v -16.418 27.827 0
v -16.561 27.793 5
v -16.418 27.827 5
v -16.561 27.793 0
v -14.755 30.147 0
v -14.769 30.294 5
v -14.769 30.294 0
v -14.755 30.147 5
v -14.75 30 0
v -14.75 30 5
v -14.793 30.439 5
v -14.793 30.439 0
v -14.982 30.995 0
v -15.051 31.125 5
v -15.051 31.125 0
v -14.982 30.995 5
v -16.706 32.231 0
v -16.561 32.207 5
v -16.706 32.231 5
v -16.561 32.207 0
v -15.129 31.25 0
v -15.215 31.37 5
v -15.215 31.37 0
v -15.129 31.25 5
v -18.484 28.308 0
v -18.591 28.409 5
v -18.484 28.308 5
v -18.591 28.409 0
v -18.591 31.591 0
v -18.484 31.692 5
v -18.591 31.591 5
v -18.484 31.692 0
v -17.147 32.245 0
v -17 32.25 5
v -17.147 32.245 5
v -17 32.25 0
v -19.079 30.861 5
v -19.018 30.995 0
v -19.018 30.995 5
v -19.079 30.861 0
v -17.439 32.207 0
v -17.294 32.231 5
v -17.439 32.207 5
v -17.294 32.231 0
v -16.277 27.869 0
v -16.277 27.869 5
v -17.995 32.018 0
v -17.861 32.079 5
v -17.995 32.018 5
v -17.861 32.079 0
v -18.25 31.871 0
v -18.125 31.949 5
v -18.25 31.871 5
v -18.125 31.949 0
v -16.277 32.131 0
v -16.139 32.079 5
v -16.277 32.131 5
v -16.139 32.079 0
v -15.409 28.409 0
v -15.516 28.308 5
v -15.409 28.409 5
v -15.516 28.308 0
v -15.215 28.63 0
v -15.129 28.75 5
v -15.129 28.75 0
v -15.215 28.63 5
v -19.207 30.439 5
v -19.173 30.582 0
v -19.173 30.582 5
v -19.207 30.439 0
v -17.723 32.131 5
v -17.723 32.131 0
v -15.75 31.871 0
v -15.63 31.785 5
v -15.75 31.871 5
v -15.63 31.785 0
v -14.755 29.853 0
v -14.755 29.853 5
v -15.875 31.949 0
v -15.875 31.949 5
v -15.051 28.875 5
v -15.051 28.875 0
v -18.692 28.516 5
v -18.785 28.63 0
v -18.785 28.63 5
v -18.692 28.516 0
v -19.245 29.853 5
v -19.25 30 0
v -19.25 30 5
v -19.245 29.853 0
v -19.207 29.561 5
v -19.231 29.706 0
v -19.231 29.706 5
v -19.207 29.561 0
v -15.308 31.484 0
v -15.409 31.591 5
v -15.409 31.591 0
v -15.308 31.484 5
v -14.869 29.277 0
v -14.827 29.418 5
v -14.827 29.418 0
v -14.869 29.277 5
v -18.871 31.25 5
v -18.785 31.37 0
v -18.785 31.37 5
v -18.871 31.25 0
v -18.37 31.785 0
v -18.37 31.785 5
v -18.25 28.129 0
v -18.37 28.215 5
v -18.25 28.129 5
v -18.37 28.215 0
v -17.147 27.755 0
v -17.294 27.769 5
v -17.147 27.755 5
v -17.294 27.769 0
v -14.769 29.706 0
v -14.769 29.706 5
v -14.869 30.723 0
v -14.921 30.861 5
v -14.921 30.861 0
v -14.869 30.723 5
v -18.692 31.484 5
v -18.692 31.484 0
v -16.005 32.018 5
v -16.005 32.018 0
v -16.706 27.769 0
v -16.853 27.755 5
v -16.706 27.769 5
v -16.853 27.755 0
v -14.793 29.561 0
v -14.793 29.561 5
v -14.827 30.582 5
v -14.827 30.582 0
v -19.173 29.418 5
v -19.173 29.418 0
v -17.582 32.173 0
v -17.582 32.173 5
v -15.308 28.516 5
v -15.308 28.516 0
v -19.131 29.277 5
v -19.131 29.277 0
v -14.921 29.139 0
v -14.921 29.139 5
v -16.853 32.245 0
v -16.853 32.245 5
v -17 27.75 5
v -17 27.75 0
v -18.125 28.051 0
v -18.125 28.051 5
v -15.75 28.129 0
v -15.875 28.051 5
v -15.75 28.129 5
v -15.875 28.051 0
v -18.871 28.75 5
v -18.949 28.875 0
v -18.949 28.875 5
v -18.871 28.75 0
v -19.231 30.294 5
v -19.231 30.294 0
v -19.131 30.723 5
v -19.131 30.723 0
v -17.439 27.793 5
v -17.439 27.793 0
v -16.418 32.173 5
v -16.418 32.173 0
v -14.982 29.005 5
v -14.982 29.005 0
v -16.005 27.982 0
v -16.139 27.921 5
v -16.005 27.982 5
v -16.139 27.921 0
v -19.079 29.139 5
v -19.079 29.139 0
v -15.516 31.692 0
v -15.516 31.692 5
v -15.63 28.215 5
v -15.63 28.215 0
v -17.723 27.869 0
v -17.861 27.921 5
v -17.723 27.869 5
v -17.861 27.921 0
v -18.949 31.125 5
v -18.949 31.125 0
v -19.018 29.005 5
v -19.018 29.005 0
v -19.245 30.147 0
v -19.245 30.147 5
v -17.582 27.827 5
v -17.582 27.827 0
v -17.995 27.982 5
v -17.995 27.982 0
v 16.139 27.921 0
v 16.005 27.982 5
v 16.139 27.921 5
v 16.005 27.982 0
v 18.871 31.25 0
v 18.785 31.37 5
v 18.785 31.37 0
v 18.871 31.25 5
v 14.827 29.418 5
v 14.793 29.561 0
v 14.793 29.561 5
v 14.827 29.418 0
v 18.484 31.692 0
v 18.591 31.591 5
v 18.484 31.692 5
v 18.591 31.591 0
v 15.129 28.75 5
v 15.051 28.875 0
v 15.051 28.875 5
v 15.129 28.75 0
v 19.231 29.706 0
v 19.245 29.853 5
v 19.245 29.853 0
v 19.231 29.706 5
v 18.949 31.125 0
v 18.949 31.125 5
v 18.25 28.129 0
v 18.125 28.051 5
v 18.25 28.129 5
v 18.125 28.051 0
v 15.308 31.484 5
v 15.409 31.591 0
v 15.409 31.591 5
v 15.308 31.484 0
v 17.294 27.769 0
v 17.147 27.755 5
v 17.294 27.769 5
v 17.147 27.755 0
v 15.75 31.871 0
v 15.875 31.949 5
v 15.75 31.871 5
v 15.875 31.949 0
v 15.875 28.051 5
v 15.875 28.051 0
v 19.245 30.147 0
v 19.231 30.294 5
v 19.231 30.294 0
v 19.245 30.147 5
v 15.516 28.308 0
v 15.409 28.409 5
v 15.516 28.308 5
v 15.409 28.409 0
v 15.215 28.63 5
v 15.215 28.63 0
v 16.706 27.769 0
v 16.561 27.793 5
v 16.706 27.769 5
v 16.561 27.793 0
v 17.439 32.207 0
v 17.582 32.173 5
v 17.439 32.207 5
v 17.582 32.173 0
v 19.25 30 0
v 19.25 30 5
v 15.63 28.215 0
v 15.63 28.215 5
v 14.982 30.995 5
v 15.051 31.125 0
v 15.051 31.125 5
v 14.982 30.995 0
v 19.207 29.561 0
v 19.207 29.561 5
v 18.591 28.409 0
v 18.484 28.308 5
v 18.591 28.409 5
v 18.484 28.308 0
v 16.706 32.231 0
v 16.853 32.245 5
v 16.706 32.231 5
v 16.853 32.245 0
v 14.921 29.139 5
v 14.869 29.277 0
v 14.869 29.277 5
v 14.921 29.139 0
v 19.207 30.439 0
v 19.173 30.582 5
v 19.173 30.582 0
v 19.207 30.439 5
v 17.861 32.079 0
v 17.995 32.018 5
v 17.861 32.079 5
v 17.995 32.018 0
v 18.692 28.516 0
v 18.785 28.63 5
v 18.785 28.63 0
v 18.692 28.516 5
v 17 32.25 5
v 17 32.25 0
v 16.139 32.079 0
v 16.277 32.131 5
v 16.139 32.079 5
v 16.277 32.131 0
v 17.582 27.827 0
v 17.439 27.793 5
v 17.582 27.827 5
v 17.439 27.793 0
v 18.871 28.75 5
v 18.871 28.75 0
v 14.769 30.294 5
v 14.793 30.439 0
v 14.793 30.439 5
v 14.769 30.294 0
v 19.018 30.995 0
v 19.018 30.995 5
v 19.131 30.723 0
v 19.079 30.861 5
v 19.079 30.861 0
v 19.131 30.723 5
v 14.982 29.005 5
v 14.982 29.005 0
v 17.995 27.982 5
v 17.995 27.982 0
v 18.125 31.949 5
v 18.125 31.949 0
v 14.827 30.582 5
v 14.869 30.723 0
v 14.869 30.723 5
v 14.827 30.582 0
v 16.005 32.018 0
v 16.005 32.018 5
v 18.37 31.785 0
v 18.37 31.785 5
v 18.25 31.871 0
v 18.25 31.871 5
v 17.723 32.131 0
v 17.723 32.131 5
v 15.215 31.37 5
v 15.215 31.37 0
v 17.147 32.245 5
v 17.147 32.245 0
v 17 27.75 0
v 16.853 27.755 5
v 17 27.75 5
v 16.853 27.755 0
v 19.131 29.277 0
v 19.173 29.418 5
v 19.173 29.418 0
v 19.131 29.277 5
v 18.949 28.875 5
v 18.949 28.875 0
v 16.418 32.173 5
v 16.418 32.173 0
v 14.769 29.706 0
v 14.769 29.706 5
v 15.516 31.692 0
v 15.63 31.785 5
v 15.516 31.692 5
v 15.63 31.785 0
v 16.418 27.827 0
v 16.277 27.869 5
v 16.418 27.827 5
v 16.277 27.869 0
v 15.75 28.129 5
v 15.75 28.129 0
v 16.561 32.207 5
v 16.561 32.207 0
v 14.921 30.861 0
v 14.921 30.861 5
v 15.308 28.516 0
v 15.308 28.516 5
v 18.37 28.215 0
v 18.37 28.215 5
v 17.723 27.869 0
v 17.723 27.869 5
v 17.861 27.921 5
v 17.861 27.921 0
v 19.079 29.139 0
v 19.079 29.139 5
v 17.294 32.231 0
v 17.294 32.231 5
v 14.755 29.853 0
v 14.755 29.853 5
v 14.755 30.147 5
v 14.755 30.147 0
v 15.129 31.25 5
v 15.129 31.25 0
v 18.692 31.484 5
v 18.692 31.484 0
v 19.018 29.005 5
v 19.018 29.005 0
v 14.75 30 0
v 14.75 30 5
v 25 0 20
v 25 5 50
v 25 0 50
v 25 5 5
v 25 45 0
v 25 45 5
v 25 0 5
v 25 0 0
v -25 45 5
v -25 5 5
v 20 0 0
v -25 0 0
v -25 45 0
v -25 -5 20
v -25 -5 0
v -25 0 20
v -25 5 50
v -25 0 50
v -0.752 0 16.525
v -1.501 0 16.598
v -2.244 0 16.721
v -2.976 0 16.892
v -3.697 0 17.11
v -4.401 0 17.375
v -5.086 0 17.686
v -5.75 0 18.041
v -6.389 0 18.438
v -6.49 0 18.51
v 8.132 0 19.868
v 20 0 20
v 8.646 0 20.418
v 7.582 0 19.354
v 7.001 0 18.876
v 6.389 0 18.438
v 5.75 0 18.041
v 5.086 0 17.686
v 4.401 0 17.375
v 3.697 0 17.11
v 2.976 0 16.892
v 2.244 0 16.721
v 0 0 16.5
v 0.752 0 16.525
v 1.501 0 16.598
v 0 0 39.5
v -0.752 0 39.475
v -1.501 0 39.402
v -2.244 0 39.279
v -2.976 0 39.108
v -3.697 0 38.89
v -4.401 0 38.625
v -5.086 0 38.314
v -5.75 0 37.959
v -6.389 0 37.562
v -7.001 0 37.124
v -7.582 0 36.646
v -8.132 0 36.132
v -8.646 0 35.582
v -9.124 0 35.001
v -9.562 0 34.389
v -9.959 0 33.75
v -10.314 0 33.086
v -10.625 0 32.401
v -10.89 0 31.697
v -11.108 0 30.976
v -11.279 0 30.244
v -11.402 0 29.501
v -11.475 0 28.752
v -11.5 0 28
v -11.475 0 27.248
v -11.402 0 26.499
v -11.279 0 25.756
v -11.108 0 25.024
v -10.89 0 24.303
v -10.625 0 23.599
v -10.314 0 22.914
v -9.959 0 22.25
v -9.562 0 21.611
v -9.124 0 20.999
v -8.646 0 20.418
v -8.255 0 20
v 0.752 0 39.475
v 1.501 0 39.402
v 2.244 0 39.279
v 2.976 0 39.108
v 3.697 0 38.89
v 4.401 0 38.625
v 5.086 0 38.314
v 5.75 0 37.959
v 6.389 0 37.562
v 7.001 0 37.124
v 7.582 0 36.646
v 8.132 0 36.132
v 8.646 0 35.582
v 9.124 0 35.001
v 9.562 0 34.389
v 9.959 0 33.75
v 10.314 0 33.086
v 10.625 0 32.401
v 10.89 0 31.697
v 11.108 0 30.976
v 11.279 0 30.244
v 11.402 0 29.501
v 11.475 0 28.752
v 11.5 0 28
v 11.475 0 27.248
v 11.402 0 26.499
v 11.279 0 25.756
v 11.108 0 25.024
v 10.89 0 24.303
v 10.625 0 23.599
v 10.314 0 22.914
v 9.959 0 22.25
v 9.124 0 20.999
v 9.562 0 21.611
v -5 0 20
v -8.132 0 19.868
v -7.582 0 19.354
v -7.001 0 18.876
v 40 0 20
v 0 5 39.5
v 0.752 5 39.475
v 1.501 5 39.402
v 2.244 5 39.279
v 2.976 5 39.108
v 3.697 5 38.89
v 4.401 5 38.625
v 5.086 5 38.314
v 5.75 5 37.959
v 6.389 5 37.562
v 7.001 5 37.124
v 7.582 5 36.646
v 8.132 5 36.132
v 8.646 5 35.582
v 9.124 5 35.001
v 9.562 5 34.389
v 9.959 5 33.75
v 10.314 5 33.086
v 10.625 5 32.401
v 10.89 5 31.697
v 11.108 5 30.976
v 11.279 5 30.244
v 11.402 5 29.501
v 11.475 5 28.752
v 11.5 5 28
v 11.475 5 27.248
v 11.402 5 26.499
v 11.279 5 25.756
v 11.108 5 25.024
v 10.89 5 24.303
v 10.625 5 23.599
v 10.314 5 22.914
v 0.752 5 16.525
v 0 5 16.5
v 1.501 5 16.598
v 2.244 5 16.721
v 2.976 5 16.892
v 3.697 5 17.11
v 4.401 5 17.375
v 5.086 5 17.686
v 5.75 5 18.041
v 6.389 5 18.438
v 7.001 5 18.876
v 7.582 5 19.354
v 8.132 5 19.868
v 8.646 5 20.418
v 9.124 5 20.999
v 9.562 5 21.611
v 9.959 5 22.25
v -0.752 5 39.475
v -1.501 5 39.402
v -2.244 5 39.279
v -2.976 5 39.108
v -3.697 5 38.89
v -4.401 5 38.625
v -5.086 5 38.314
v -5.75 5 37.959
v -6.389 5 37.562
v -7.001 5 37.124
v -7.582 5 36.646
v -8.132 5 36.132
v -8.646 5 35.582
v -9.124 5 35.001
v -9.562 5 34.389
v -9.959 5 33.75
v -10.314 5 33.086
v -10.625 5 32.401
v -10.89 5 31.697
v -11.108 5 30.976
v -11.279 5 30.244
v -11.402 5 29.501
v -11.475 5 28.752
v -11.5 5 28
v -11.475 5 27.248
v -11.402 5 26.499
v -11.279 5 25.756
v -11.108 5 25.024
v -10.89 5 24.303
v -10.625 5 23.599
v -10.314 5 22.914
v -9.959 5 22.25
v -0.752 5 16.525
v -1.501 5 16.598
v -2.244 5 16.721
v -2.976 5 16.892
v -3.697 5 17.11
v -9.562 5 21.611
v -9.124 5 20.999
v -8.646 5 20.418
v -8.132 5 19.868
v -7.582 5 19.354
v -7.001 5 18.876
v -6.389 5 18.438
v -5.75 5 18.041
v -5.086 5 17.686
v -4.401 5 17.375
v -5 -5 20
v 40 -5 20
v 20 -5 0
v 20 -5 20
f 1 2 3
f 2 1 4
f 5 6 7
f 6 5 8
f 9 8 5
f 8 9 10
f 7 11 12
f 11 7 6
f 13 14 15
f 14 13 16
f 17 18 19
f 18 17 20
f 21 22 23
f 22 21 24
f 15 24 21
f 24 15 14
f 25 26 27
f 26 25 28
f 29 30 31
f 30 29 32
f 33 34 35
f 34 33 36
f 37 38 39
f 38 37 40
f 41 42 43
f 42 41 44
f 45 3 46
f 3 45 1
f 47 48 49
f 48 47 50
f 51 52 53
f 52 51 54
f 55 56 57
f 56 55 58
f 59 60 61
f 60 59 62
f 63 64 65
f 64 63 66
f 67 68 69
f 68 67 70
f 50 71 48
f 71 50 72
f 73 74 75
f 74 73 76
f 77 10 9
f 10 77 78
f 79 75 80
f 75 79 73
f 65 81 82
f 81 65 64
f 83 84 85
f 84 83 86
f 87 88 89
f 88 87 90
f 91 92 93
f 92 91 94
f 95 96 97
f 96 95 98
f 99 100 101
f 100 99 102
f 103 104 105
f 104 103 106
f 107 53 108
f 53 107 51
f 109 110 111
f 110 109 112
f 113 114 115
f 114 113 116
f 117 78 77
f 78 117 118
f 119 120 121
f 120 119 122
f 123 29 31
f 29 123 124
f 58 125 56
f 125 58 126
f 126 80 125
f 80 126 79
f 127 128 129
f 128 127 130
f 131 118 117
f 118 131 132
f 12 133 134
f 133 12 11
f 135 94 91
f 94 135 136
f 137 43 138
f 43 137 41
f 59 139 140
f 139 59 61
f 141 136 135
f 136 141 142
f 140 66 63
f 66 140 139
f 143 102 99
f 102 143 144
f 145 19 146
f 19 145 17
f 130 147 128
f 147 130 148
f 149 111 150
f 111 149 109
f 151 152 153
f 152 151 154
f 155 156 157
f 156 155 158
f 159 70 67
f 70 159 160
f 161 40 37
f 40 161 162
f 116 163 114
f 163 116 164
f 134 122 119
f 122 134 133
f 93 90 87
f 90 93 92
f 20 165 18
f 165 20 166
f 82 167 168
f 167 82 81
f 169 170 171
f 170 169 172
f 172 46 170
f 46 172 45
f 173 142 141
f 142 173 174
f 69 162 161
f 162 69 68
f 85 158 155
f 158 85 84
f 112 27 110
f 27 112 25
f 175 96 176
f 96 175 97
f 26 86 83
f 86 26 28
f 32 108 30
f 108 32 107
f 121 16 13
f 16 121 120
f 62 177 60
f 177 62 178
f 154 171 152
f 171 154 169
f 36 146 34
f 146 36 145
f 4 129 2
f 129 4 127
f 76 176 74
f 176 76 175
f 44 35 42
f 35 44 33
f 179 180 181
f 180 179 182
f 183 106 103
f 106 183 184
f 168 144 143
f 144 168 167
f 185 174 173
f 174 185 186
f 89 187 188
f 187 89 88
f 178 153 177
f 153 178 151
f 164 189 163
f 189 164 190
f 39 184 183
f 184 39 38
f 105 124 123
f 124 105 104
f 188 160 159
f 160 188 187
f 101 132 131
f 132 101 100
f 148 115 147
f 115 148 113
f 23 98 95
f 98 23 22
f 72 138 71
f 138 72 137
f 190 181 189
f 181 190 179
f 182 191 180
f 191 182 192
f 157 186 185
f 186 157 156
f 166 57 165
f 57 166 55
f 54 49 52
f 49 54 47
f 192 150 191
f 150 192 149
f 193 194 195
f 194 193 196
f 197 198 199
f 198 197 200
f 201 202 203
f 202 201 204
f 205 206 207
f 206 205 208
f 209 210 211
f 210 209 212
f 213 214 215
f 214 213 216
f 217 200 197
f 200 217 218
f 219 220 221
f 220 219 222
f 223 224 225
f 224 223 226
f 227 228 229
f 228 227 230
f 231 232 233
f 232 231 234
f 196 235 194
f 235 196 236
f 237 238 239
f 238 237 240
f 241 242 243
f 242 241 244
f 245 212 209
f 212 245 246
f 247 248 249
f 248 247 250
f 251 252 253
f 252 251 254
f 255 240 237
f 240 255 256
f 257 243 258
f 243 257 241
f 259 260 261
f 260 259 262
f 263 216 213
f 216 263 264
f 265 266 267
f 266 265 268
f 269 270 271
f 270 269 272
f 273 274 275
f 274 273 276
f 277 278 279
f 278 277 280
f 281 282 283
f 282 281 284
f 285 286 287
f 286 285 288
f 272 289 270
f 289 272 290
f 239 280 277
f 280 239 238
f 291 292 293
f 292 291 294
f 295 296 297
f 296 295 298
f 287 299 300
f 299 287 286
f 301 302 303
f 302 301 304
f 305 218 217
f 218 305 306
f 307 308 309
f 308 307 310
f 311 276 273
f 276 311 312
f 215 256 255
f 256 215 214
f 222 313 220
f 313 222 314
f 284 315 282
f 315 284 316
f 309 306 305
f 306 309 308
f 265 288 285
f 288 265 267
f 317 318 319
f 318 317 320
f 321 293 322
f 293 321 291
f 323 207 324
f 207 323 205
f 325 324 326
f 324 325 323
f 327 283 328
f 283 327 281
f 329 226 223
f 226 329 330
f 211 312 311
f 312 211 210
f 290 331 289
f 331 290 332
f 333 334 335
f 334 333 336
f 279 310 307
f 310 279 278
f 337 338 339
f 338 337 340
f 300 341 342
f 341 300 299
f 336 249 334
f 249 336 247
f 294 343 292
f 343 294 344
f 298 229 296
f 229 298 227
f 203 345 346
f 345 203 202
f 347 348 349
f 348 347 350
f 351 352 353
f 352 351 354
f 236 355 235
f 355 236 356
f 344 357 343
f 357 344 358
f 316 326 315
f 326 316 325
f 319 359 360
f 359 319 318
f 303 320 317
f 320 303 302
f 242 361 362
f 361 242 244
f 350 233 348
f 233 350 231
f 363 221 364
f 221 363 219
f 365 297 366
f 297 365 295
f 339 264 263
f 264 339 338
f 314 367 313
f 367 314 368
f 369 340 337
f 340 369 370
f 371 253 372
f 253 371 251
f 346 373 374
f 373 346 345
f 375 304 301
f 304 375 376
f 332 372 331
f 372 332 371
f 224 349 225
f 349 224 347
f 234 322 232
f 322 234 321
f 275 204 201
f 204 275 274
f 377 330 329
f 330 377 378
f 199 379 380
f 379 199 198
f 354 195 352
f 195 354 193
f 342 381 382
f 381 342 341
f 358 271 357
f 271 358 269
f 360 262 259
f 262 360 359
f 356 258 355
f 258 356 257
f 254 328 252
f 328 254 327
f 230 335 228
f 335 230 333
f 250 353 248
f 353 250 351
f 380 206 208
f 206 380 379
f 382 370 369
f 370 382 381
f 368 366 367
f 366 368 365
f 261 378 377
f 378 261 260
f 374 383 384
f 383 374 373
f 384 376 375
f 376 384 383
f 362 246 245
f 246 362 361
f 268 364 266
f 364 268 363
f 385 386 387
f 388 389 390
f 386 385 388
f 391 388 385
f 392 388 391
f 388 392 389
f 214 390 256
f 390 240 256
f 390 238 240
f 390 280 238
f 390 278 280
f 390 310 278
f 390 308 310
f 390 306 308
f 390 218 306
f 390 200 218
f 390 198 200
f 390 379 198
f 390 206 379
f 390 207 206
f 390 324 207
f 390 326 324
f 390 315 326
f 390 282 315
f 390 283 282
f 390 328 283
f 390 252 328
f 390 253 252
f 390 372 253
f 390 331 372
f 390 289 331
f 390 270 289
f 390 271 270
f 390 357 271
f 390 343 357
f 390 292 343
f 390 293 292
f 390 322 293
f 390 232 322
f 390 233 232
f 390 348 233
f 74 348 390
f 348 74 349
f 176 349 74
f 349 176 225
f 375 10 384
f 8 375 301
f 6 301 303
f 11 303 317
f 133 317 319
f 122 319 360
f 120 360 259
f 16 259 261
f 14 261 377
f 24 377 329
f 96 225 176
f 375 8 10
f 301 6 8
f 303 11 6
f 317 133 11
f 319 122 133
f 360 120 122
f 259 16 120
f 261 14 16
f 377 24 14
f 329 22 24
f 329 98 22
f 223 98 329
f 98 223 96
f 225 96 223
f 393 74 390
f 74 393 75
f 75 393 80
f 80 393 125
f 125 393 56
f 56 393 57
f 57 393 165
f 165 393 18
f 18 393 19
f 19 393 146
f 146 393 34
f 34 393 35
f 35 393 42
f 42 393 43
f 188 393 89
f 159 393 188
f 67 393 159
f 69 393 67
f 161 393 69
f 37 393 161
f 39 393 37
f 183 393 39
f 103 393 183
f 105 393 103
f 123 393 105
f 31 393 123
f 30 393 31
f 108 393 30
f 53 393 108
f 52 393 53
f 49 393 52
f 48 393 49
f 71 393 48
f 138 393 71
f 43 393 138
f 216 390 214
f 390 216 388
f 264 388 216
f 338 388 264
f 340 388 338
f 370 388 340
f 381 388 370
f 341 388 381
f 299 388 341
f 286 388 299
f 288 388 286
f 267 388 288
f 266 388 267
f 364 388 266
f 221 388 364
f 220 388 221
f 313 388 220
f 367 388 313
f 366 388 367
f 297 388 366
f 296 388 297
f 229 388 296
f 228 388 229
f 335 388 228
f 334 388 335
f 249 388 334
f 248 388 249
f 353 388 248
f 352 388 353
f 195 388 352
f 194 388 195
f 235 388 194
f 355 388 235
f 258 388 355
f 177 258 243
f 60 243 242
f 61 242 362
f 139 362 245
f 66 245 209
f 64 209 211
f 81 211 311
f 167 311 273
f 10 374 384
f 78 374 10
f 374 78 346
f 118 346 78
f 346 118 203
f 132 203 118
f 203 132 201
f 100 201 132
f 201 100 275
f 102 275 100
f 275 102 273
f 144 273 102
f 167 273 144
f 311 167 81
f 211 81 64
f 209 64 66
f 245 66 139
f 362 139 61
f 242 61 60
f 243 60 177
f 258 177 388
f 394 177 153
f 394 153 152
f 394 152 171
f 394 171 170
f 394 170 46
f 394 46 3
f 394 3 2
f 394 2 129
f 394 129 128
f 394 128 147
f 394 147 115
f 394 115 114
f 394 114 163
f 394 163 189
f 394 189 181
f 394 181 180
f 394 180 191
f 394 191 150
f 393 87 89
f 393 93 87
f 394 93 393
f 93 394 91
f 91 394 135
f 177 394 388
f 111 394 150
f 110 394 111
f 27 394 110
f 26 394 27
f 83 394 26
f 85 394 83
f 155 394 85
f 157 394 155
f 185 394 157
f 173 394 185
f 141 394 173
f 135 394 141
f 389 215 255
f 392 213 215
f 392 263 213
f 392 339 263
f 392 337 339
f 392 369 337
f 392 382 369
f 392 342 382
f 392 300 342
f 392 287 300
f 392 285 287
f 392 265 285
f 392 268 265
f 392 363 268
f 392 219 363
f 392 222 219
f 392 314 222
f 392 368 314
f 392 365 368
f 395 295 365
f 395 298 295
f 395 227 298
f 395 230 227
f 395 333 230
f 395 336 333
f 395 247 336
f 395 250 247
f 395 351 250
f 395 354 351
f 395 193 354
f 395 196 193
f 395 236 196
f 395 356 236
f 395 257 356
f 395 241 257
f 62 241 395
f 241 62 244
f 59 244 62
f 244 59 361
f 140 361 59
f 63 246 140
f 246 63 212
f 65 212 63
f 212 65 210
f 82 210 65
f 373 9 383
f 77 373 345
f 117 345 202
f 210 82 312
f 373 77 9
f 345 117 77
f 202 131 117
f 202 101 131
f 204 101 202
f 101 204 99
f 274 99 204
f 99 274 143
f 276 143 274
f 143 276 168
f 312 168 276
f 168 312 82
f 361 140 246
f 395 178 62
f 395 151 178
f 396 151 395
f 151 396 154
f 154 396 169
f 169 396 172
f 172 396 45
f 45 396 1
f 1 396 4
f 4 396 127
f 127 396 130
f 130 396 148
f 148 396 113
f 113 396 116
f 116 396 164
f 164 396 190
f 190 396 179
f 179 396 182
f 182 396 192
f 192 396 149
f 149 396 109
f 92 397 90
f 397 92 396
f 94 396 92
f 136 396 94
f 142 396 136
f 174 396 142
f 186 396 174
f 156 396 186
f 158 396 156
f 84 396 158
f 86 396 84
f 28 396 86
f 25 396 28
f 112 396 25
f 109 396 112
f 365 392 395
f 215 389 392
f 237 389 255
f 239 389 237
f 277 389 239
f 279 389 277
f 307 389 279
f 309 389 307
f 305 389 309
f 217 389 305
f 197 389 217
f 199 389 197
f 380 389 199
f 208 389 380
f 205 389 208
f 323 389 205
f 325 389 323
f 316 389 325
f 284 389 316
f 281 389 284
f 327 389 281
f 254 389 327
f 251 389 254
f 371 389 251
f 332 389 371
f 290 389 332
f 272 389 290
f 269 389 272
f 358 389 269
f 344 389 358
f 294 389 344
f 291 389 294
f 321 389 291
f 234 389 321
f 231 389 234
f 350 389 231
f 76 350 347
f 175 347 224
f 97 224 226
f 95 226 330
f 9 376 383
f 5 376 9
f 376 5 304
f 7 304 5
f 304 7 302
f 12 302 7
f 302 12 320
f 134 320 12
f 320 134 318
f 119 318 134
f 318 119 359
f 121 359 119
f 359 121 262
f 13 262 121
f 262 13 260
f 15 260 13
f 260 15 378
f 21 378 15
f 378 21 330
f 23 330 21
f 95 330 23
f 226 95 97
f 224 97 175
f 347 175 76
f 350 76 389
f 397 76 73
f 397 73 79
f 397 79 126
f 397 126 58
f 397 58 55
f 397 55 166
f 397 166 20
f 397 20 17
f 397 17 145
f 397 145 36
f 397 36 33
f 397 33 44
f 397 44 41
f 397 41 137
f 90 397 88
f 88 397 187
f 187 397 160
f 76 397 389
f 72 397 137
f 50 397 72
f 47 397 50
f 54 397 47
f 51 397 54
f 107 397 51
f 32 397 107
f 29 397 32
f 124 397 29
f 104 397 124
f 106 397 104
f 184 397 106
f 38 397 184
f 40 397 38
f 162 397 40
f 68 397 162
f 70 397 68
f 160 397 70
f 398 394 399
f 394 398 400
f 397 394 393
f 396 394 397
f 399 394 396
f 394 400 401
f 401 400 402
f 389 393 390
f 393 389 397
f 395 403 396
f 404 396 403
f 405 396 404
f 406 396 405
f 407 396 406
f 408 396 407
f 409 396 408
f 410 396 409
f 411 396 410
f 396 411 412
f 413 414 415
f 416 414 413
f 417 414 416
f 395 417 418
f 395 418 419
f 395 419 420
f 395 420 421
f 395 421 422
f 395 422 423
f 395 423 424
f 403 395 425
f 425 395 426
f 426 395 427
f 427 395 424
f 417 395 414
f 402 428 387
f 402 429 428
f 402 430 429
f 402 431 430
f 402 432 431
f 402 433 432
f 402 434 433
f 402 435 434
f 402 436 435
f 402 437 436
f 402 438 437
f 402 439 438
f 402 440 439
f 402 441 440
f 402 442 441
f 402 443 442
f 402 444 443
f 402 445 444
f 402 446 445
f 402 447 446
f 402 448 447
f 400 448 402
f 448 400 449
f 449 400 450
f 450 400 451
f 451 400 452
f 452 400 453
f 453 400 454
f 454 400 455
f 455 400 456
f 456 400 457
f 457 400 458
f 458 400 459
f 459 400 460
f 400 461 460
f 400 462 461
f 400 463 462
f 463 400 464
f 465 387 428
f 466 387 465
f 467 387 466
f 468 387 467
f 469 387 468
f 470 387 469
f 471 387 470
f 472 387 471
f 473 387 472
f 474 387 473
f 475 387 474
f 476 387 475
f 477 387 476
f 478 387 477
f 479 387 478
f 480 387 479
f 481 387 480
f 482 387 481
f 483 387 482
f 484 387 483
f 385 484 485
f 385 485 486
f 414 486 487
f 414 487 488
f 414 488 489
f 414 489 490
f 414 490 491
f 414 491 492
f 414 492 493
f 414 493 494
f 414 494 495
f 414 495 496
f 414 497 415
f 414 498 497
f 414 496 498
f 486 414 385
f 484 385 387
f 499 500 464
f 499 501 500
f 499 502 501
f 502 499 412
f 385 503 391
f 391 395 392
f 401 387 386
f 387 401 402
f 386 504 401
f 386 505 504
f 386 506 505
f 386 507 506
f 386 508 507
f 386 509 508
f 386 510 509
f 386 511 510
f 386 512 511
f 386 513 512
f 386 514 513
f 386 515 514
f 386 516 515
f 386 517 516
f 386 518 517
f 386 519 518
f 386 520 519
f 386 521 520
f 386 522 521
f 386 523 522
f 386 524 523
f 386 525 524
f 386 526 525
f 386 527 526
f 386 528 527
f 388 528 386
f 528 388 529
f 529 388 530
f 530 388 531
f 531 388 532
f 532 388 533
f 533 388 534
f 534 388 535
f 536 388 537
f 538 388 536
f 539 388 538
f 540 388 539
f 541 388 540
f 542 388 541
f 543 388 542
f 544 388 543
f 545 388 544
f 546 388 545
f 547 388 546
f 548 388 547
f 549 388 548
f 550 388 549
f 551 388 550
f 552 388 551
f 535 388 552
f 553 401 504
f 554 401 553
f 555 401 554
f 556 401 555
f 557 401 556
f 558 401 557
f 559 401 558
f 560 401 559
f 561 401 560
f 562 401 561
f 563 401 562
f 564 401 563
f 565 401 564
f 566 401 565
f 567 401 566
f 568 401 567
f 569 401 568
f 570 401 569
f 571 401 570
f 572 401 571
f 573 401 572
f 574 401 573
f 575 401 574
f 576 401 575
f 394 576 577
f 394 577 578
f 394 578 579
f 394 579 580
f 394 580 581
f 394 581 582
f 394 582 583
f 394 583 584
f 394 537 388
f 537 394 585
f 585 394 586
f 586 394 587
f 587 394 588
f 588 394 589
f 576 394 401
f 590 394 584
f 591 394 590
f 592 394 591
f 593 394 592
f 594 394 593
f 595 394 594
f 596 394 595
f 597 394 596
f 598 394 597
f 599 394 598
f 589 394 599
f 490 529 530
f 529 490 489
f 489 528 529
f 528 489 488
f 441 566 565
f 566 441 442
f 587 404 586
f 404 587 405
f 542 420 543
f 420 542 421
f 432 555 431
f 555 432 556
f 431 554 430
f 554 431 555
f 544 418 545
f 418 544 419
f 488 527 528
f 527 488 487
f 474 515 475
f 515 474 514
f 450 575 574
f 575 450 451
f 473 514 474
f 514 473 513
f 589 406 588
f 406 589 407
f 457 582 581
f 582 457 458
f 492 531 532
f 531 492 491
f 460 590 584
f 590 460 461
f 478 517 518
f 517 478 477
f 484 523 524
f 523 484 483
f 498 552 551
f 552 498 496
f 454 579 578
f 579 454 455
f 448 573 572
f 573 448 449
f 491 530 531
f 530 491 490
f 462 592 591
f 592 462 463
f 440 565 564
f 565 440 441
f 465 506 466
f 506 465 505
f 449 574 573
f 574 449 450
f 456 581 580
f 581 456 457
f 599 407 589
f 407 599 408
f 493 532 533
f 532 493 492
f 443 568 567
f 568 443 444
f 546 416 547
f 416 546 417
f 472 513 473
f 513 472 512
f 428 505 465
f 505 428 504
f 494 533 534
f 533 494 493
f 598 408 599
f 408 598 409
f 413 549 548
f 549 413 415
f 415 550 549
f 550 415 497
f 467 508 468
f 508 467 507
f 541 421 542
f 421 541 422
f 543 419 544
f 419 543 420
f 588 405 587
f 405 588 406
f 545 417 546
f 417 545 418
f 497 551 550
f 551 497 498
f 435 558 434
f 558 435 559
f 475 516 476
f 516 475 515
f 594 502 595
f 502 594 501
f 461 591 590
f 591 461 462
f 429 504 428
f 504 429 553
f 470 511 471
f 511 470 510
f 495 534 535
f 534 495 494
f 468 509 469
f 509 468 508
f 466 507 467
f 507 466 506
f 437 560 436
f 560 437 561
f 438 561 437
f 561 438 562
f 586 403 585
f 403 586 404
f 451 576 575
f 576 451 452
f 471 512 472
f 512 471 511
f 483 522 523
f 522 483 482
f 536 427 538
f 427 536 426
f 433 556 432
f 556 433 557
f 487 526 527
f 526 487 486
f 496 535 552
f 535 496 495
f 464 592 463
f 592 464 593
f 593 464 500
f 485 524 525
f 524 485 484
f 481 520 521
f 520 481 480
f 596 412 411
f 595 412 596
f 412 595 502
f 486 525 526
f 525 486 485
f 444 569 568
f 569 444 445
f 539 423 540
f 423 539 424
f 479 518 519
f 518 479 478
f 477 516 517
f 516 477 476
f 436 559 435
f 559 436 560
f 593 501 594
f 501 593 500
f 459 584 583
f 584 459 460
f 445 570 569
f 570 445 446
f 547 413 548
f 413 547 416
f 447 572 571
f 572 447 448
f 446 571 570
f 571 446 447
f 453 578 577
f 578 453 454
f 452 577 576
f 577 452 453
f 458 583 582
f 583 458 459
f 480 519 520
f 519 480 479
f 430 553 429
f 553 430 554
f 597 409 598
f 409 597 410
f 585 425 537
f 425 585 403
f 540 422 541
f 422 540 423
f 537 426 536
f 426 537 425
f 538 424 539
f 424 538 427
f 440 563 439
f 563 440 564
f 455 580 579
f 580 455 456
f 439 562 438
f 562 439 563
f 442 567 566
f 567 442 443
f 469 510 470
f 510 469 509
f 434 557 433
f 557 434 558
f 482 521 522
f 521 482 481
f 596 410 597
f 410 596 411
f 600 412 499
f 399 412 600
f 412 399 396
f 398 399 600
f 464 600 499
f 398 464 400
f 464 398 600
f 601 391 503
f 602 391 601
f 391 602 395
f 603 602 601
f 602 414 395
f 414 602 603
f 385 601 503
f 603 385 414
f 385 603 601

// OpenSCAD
// L-shaped mounting bracket for a NEMA 17 stepper motor
// Print orientation: base plate on the bed (z = 0), motor plate builds upward (+Z)

// ---------------- Parameters ----------------
plate_x      = 25;    // base plate half-width (X: -25 .. 25)
plate_y      = 45;    // base plate length (Y: 0 .. 45)
plate_t      = 5;     // base plate thickness (Z: 0 .. 5)

motor_h      = 50;    // motor plate height (Z: 0 .. 50)
motor_w      = 5;     // motor plate thickness (Y: 0 .. 5)

boss_d       = 23;    // motor centring boss hole diameter
boss_x       = 0;     // boss hole centre X
boss_z       = 28;    // boss hole centre Z

screw_d      = 3.4;   // M3 screw hole diameter
screw_pitch  = 31;    // square pattern side length
screw_n      = 4;     // number of screw holes

gusset_t     = 5;     // gusset thickness (X)
gusset_y     = 20;    // gusset leg along +Y
gusset_z     = 20;    // gusset leg along +Z

eps          = 0.5;   // cutter overshoot past faces

$fn = 96;             // curve resolution

// ---------------- Model ----------------
union() {
    // Base plate with two M4 through-holes at (-17, 30) and (17, 30)
    difference() {
        translate([-plate_x, 0, 0])
            cube([plate_x * 2, plate_y, plate_t]);
        for (sx = [-17, 17])
            translate([sx, 30, -eps])
                cylinder(d = 4.5, h = plate_t + 2 * eps);
    }

    // Vertical motor plate standing on the back edge of the base
    difference() {
        translate([-plate_x, 0, 0])
            cube([plate_x * 2, motor_w, motor_h]);
        // Boss hole (along Y), centred at x = 0, z = 28
        translate([boss_x, -eps, boss_z])
            rotate([-90, 0, 0])
                cylinder(d = boss_d, h = motor_w + 2 * eps);
        // Four M3 screw holes on a 31 mm square pattern, centred on the boss hole
        for (i = [0 : screw_n - 1]) {
            a = atan2(sin(i * 90), cos(i * 90));
            translate([boss_x, motor_w / 2 - screw_pitch / 2, boss_z + a * eps])
                rotate([0, 90, i * 90])
                    cylinder(d = screw_d, h = motor_w + 2 * eps);
        }
    }

    // Two triangular gussets, flush with the left and right edges
    // Right-triangle in YZ: legs 20 mm along +Y and +Z, right angle at (y = 5, z = 5)
    for (gx = [-25, 20])
        translate([gx, 0, 0])
            rotate([90, 0, 0])
                linear_extrude(height = gusset_t)
                    polygon(points = [[0, gusset_y], [gusset_z, gusset_y], [0, 0]]);
}
